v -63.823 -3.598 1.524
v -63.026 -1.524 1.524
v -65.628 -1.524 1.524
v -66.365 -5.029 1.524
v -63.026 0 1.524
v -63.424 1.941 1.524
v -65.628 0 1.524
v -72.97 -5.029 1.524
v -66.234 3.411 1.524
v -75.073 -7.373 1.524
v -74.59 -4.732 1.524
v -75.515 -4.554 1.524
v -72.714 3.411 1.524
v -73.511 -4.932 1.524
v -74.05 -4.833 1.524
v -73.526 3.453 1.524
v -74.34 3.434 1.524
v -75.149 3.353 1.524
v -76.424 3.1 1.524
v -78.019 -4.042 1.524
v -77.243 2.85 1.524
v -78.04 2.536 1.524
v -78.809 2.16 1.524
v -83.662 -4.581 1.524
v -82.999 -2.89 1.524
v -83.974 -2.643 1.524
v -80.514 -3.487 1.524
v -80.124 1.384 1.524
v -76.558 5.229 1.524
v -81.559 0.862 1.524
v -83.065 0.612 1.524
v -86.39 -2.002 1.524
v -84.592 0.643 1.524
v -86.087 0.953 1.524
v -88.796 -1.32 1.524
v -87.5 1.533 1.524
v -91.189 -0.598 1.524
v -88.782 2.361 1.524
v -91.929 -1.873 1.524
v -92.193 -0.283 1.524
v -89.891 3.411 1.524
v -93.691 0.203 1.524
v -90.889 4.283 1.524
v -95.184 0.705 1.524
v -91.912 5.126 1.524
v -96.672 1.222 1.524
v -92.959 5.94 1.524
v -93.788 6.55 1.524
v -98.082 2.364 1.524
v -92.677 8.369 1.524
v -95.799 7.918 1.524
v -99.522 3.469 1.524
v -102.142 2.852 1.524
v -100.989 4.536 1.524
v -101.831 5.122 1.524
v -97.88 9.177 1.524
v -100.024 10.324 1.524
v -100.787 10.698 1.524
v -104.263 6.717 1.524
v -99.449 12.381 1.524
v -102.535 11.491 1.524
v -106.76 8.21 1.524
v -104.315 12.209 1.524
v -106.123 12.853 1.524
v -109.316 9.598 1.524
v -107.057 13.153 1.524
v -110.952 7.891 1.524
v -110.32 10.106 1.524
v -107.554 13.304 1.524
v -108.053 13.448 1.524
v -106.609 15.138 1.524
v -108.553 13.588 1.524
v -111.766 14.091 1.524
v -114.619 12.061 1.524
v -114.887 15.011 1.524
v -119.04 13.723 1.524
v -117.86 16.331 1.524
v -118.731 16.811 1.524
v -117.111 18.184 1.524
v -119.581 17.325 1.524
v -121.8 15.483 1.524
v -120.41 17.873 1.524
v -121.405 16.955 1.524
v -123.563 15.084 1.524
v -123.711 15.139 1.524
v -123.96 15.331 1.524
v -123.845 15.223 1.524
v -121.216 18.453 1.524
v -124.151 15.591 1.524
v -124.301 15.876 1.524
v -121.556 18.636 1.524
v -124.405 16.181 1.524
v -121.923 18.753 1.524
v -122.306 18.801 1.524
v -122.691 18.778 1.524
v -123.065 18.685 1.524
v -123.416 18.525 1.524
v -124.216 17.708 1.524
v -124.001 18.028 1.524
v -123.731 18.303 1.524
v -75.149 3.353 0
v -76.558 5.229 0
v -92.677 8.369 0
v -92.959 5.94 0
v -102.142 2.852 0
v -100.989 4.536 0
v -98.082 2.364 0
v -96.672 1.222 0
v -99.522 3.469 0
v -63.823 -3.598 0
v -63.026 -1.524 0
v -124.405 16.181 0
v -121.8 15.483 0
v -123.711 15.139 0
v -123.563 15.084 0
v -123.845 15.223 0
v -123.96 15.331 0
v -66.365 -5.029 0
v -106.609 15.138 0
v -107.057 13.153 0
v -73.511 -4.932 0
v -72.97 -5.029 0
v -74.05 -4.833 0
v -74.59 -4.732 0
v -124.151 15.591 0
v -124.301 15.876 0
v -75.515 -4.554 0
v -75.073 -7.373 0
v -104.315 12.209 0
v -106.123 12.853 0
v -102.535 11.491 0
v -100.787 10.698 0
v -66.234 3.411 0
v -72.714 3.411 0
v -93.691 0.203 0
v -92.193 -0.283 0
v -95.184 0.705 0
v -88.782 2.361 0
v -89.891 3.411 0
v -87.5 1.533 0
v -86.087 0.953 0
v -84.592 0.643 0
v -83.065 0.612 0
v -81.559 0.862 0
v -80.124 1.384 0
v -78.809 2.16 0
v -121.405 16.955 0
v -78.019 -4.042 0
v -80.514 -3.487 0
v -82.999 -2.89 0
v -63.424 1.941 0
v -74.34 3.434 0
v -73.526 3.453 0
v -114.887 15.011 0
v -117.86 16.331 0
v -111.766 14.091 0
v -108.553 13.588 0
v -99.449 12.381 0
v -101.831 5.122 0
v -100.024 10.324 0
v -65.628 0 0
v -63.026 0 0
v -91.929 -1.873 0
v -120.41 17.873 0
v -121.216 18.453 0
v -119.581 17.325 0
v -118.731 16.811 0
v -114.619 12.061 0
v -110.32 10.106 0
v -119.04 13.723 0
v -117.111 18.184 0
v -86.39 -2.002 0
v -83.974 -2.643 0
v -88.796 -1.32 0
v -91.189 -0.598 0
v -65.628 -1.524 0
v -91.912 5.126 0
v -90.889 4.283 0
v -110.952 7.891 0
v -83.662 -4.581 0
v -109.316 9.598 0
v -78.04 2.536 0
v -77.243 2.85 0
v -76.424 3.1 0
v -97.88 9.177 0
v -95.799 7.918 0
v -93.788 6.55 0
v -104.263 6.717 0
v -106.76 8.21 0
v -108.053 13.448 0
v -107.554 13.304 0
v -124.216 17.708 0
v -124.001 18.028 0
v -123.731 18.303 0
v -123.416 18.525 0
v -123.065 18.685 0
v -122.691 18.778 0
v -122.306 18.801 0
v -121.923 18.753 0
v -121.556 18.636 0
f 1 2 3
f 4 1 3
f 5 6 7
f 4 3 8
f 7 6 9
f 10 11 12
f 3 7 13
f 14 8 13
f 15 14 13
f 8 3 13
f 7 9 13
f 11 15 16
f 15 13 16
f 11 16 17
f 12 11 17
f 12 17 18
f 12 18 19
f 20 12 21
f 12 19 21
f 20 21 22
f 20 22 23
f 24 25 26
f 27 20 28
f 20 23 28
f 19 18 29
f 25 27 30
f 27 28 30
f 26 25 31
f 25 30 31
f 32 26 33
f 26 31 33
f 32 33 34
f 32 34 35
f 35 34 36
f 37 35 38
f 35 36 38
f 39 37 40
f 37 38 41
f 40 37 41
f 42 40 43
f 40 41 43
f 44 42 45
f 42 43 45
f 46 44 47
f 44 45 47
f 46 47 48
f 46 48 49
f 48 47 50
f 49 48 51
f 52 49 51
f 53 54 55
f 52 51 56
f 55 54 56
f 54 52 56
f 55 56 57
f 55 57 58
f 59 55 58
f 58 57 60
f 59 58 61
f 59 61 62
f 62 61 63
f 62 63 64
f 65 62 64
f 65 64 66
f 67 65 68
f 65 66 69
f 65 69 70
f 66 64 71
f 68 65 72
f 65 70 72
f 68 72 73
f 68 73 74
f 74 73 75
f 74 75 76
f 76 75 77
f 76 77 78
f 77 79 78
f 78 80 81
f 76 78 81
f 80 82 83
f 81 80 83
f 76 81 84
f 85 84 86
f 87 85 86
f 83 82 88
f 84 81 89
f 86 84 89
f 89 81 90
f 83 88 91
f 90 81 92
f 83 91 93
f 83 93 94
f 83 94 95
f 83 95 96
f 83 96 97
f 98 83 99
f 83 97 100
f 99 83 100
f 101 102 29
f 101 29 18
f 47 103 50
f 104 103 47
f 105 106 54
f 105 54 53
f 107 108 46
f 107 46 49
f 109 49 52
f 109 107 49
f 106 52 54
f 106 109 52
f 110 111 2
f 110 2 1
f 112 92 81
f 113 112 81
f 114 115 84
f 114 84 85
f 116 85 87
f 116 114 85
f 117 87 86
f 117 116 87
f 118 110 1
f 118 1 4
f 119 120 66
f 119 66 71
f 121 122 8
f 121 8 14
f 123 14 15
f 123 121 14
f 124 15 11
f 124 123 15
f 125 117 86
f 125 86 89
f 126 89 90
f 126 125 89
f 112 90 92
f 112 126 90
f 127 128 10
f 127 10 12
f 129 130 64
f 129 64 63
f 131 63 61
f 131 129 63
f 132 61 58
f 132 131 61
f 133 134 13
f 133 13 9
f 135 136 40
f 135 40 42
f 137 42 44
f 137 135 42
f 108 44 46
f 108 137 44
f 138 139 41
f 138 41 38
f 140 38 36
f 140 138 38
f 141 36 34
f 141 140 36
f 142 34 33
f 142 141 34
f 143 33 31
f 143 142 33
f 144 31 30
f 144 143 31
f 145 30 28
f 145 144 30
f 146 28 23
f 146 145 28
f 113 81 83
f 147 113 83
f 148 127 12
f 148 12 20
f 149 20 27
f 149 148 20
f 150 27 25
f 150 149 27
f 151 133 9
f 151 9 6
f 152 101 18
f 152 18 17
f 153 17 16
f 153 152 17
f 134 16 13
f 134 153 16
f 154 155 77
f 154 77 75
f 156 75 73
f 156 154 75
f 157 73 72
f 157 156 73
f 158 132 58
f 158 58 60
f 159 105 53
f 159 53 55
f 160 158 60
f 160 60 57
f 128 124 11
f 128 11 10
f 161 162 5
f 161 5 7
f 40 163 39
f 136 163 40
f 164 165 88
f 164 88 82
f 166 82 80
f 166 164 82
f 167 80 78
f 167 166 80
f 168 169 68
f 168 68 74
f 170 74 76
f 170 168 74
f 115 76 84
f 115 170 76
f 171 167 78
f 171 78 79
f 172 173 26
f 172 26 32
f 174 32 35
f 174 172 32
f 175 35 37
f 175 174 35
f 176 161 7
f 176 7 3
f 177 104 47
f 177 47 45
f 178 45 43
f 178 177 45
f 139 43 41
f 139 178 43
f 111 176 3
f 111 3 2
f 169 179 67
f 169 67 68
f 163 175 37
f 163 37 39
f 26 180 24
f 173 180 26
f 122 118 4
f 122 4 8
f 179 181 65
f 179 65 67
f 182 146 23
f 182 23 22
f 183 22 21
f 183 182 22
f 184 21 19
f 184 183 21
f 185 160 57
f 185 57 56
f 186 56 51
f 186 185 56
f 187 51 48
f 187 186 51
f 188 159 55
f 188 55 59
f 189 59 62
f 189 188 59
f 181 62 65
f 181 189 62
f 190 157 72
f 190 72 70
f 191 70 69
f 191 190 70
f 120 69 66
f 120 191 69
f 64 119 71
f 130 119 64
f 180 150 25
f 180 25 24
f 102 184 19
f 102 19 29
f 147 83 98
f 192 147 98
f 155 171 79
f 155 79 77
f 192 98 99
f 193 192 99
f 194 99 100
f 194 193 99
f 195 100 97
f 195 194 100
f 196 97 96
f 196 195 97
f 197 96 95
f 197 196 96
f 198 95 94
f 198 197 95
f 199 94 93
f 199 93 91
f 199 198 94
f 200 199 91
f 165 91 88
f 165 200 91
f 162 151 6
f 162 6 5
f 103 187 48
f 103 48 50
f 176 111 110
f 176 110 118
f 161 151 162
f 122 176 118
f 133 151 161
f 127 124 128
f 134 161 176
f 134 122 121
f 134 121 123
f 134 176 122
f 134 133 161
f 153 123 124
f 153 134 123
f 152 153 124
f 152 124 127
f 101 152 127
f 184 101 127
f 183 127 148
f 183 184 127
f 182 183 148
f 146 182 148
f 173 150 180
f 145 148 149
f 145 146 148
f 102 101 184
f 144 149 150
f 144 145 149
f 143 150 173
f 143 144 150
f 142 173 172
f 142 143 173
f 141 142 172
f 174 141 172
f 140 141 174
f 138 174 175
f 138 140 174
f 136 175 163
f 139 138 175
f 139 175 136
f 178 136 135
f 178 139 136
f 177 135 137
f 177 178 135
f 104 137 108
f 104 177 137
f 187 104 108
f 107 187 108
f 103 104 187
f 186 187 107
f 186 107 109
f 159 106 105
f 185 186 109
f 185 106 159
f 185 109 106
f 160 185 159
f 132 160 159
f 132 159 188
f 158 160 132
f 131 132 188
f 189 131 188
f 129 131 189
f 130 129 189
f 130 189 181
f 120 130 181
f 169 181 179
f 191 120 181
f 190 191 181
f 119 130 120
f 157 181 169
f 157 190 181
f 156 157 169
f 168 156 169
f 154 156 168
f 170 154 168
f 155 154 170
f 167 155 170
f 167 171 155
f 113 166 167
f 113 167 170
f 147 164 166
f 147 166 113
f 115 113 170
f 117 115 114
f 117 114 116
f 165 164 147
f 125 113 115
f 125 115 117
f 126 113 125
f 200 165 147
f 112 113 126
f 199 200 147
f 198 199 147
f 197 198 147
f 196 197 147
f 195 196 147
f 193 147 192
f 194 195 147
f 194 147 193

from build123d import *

# Parameters (mm, degrees)
BOSS_EXTRUDE1_DEPTH = 1.524
CUT_EXTRUDE1_DEPTH  = 1.524


with BuildPart() as part:
    # Sketch1 → Boss-Extrude1 (new body)
    with BuildSketch(Plane.XY):
        with BuildLine():
            Line((-65.62844389, -1.524), (-63.025670989, -1.524))
            Line((-63.025670989, -1.524), (-63.822514801, -3.597982164))
            Line((-63.822514801, -3.597982164), (-66.364740688, -5.02874479))
            Line((-66.364740688, -5.02874479), (-72.970412181, -5.02874479))
            ThreePointArc((-72.970412181, -5.02874479), (-73.780479042, -4.88253576), (-74.589728748, -4.731869528))
            Line((-74.589728748, -4.731869528), (-75.073084302, -7.372952412))
            Line((-75.073084302, -7.372952412), (-75.51502387, -4.553940069))
            ThreePointArc((-75.51502387, -4.553940069), (-79.267617574, -3.769993691), (-82.998880802, -2.890103837))
            Line((-82.998880802, -2.890103837), (-83.662208167, -4.580640418))
            Line((-83.662208167, -4.580640418), (-83.9742265, -2.643374593))
            ThreePointArc((-83.9742265, -2.643374593), (-87.594512539, -1.666053196), (-91.189152721, -0.598256357))
            Line((-91.189152721, -0.598256357), (-91.929187087, -1.873078309))
            Line((-91.929187087, -1.873078309), (-92.192549363, -0.282576404))
            ThreePointArc((-92.192549363, -0.282576404), (-94.43829357, 0.452244536), (-96.672145794, 1.2224608))
            ThreePointArc((-96.672145794, 1.2224608), (-98.79856677, 2.920982901), (-100.989304929, 4.535699537))
            Line((-100.989304929, 4.535699537), (-102.141504416, 2.851715672))
            Line((-102.141504416, 2.851715672), (-101.830844258, 5.121924515))
            ThreePointArc((-101.830844258, 5.121924515), (-105.503835902, 7.476274523), (-109.316148256, 9.597619873))
            Line((-109.316148256, 9.597619873), (-110.95226101, 7.891468444))
            Line((-110.95226101, 7.891468444), (-110.319639872, 10.105642428))
            ThreePointArc((-110.319639872, 10.105642428), (-116.815196671, 12.929470472), (-123.562513889, 15.083530197))
            ThreePointArc((-123.562513889, 15.083530197), (-123.779823463, 15.177511529), (-123.959746364, 15.331406595))
            ThreePointArc((-123.959746364, 15.331406595), (-123.949496649, 18.088692586), (-121.216404531, 18.453300008))
            ThreePointArc((-121.216404531, 18.453300008), (-119.99831308, 17.594979685), (-118.73086738, 16.811371391))
            Line((-118.73086738, 16.811371391), (-117.11063531, 18.184449417))
            Line((-117.11063531, 18.184449417), (-117.859531811, 16.331247904))
            ThreePointArc((-117.859531811, 16.331247904), (-113.341616748, 14.499894981), (-108.552725398, 13.587793188))
            ThreePointArc((-108.552725398, 13.587793188), (-107.803028846, 13.376700844), (-107.057015293, 13.152940531))
            Line((-107.057015293, 13.152940531), (-106.609325514, 15.13772615))
            Line((-106.609325514, 15.13772615), (-106.122626057, 12.853069881))
            ThreePointArc((-106.122626057, 12.853069881), (-103.421109493, 11.859213859), (-100.787074077, 10.698266414))
            Line((-100.787074077, 10.698266414), (-99.448684771, 12.381094003))
            Line((-99.448684771, 12.381094003), (-100.023702083, 10.324148845))
            ThreePointArc((-100.023702083, 10.324148845), (-96.831167643, 8.560951785), (-93.788416789, 6.550278449))
            Line((-93.788416789, 6.550278449), (-92.677002467, 8.368956431))
            Line((-92.677002467, 8.368956431), (-92.959454339, 5.939754488))
            ThreePointArc((-92.959454339, 5.939754488), (-91.397772197, 4.708540381), (-89.890787426, 3.410951775))
            ThreePointArc((-89.890787426, 3.410951775), (-84.591869737, 0.643036614), (-78.809267625, 2.160071819))
            ThreePointArc((-78.809267625, 2.160071819), (-77.644578081, 2.700645179), (-76.424081928, 3.09953167))
            Line((-76.424081928, 3.09953167), (-76.558408494, 5.228958142))
            Line((-76.558408494, 5.228958142), (-75.149258413, 3.353285973))
            ThreePointArc((-75.149258413, 3.353285973), (-73.933139466, 3.450839152), (-72.713766302, 3.410951775))
            Line((-72.713766302, 3.410951775), (-66.233949818, 3.410951775))
            Line((-66.233949818, 3.410951775), (-63.424092895, 1.94149826))
            Line((-63.424092895, 1.94149826), (-63.025670989, 0))
            Line((-63.025670989, 0), (-65.62844389, 0))
            Line((-65.62844389, 0), (-65.62844389, -1.524))
        make_face()
    extrude(amount=BOSS_EXTRUDE1_DEPTH)

    # Sketch2 → Cut-Extrude1 (cut)
    with BuildSketch(Plane.XY.offset(1.524)):
        Polygon((-126.267748699, 16.679917712), (-121.799652461, 15.482694933), (-121.405212236, 16.954765892), (-125.873308475, 18.151988671), align=None)
    extrude(amount=-CUT_EXTRUDE1_DEPTH, mode=Mode.SUBTRACT)


solid = part.part
